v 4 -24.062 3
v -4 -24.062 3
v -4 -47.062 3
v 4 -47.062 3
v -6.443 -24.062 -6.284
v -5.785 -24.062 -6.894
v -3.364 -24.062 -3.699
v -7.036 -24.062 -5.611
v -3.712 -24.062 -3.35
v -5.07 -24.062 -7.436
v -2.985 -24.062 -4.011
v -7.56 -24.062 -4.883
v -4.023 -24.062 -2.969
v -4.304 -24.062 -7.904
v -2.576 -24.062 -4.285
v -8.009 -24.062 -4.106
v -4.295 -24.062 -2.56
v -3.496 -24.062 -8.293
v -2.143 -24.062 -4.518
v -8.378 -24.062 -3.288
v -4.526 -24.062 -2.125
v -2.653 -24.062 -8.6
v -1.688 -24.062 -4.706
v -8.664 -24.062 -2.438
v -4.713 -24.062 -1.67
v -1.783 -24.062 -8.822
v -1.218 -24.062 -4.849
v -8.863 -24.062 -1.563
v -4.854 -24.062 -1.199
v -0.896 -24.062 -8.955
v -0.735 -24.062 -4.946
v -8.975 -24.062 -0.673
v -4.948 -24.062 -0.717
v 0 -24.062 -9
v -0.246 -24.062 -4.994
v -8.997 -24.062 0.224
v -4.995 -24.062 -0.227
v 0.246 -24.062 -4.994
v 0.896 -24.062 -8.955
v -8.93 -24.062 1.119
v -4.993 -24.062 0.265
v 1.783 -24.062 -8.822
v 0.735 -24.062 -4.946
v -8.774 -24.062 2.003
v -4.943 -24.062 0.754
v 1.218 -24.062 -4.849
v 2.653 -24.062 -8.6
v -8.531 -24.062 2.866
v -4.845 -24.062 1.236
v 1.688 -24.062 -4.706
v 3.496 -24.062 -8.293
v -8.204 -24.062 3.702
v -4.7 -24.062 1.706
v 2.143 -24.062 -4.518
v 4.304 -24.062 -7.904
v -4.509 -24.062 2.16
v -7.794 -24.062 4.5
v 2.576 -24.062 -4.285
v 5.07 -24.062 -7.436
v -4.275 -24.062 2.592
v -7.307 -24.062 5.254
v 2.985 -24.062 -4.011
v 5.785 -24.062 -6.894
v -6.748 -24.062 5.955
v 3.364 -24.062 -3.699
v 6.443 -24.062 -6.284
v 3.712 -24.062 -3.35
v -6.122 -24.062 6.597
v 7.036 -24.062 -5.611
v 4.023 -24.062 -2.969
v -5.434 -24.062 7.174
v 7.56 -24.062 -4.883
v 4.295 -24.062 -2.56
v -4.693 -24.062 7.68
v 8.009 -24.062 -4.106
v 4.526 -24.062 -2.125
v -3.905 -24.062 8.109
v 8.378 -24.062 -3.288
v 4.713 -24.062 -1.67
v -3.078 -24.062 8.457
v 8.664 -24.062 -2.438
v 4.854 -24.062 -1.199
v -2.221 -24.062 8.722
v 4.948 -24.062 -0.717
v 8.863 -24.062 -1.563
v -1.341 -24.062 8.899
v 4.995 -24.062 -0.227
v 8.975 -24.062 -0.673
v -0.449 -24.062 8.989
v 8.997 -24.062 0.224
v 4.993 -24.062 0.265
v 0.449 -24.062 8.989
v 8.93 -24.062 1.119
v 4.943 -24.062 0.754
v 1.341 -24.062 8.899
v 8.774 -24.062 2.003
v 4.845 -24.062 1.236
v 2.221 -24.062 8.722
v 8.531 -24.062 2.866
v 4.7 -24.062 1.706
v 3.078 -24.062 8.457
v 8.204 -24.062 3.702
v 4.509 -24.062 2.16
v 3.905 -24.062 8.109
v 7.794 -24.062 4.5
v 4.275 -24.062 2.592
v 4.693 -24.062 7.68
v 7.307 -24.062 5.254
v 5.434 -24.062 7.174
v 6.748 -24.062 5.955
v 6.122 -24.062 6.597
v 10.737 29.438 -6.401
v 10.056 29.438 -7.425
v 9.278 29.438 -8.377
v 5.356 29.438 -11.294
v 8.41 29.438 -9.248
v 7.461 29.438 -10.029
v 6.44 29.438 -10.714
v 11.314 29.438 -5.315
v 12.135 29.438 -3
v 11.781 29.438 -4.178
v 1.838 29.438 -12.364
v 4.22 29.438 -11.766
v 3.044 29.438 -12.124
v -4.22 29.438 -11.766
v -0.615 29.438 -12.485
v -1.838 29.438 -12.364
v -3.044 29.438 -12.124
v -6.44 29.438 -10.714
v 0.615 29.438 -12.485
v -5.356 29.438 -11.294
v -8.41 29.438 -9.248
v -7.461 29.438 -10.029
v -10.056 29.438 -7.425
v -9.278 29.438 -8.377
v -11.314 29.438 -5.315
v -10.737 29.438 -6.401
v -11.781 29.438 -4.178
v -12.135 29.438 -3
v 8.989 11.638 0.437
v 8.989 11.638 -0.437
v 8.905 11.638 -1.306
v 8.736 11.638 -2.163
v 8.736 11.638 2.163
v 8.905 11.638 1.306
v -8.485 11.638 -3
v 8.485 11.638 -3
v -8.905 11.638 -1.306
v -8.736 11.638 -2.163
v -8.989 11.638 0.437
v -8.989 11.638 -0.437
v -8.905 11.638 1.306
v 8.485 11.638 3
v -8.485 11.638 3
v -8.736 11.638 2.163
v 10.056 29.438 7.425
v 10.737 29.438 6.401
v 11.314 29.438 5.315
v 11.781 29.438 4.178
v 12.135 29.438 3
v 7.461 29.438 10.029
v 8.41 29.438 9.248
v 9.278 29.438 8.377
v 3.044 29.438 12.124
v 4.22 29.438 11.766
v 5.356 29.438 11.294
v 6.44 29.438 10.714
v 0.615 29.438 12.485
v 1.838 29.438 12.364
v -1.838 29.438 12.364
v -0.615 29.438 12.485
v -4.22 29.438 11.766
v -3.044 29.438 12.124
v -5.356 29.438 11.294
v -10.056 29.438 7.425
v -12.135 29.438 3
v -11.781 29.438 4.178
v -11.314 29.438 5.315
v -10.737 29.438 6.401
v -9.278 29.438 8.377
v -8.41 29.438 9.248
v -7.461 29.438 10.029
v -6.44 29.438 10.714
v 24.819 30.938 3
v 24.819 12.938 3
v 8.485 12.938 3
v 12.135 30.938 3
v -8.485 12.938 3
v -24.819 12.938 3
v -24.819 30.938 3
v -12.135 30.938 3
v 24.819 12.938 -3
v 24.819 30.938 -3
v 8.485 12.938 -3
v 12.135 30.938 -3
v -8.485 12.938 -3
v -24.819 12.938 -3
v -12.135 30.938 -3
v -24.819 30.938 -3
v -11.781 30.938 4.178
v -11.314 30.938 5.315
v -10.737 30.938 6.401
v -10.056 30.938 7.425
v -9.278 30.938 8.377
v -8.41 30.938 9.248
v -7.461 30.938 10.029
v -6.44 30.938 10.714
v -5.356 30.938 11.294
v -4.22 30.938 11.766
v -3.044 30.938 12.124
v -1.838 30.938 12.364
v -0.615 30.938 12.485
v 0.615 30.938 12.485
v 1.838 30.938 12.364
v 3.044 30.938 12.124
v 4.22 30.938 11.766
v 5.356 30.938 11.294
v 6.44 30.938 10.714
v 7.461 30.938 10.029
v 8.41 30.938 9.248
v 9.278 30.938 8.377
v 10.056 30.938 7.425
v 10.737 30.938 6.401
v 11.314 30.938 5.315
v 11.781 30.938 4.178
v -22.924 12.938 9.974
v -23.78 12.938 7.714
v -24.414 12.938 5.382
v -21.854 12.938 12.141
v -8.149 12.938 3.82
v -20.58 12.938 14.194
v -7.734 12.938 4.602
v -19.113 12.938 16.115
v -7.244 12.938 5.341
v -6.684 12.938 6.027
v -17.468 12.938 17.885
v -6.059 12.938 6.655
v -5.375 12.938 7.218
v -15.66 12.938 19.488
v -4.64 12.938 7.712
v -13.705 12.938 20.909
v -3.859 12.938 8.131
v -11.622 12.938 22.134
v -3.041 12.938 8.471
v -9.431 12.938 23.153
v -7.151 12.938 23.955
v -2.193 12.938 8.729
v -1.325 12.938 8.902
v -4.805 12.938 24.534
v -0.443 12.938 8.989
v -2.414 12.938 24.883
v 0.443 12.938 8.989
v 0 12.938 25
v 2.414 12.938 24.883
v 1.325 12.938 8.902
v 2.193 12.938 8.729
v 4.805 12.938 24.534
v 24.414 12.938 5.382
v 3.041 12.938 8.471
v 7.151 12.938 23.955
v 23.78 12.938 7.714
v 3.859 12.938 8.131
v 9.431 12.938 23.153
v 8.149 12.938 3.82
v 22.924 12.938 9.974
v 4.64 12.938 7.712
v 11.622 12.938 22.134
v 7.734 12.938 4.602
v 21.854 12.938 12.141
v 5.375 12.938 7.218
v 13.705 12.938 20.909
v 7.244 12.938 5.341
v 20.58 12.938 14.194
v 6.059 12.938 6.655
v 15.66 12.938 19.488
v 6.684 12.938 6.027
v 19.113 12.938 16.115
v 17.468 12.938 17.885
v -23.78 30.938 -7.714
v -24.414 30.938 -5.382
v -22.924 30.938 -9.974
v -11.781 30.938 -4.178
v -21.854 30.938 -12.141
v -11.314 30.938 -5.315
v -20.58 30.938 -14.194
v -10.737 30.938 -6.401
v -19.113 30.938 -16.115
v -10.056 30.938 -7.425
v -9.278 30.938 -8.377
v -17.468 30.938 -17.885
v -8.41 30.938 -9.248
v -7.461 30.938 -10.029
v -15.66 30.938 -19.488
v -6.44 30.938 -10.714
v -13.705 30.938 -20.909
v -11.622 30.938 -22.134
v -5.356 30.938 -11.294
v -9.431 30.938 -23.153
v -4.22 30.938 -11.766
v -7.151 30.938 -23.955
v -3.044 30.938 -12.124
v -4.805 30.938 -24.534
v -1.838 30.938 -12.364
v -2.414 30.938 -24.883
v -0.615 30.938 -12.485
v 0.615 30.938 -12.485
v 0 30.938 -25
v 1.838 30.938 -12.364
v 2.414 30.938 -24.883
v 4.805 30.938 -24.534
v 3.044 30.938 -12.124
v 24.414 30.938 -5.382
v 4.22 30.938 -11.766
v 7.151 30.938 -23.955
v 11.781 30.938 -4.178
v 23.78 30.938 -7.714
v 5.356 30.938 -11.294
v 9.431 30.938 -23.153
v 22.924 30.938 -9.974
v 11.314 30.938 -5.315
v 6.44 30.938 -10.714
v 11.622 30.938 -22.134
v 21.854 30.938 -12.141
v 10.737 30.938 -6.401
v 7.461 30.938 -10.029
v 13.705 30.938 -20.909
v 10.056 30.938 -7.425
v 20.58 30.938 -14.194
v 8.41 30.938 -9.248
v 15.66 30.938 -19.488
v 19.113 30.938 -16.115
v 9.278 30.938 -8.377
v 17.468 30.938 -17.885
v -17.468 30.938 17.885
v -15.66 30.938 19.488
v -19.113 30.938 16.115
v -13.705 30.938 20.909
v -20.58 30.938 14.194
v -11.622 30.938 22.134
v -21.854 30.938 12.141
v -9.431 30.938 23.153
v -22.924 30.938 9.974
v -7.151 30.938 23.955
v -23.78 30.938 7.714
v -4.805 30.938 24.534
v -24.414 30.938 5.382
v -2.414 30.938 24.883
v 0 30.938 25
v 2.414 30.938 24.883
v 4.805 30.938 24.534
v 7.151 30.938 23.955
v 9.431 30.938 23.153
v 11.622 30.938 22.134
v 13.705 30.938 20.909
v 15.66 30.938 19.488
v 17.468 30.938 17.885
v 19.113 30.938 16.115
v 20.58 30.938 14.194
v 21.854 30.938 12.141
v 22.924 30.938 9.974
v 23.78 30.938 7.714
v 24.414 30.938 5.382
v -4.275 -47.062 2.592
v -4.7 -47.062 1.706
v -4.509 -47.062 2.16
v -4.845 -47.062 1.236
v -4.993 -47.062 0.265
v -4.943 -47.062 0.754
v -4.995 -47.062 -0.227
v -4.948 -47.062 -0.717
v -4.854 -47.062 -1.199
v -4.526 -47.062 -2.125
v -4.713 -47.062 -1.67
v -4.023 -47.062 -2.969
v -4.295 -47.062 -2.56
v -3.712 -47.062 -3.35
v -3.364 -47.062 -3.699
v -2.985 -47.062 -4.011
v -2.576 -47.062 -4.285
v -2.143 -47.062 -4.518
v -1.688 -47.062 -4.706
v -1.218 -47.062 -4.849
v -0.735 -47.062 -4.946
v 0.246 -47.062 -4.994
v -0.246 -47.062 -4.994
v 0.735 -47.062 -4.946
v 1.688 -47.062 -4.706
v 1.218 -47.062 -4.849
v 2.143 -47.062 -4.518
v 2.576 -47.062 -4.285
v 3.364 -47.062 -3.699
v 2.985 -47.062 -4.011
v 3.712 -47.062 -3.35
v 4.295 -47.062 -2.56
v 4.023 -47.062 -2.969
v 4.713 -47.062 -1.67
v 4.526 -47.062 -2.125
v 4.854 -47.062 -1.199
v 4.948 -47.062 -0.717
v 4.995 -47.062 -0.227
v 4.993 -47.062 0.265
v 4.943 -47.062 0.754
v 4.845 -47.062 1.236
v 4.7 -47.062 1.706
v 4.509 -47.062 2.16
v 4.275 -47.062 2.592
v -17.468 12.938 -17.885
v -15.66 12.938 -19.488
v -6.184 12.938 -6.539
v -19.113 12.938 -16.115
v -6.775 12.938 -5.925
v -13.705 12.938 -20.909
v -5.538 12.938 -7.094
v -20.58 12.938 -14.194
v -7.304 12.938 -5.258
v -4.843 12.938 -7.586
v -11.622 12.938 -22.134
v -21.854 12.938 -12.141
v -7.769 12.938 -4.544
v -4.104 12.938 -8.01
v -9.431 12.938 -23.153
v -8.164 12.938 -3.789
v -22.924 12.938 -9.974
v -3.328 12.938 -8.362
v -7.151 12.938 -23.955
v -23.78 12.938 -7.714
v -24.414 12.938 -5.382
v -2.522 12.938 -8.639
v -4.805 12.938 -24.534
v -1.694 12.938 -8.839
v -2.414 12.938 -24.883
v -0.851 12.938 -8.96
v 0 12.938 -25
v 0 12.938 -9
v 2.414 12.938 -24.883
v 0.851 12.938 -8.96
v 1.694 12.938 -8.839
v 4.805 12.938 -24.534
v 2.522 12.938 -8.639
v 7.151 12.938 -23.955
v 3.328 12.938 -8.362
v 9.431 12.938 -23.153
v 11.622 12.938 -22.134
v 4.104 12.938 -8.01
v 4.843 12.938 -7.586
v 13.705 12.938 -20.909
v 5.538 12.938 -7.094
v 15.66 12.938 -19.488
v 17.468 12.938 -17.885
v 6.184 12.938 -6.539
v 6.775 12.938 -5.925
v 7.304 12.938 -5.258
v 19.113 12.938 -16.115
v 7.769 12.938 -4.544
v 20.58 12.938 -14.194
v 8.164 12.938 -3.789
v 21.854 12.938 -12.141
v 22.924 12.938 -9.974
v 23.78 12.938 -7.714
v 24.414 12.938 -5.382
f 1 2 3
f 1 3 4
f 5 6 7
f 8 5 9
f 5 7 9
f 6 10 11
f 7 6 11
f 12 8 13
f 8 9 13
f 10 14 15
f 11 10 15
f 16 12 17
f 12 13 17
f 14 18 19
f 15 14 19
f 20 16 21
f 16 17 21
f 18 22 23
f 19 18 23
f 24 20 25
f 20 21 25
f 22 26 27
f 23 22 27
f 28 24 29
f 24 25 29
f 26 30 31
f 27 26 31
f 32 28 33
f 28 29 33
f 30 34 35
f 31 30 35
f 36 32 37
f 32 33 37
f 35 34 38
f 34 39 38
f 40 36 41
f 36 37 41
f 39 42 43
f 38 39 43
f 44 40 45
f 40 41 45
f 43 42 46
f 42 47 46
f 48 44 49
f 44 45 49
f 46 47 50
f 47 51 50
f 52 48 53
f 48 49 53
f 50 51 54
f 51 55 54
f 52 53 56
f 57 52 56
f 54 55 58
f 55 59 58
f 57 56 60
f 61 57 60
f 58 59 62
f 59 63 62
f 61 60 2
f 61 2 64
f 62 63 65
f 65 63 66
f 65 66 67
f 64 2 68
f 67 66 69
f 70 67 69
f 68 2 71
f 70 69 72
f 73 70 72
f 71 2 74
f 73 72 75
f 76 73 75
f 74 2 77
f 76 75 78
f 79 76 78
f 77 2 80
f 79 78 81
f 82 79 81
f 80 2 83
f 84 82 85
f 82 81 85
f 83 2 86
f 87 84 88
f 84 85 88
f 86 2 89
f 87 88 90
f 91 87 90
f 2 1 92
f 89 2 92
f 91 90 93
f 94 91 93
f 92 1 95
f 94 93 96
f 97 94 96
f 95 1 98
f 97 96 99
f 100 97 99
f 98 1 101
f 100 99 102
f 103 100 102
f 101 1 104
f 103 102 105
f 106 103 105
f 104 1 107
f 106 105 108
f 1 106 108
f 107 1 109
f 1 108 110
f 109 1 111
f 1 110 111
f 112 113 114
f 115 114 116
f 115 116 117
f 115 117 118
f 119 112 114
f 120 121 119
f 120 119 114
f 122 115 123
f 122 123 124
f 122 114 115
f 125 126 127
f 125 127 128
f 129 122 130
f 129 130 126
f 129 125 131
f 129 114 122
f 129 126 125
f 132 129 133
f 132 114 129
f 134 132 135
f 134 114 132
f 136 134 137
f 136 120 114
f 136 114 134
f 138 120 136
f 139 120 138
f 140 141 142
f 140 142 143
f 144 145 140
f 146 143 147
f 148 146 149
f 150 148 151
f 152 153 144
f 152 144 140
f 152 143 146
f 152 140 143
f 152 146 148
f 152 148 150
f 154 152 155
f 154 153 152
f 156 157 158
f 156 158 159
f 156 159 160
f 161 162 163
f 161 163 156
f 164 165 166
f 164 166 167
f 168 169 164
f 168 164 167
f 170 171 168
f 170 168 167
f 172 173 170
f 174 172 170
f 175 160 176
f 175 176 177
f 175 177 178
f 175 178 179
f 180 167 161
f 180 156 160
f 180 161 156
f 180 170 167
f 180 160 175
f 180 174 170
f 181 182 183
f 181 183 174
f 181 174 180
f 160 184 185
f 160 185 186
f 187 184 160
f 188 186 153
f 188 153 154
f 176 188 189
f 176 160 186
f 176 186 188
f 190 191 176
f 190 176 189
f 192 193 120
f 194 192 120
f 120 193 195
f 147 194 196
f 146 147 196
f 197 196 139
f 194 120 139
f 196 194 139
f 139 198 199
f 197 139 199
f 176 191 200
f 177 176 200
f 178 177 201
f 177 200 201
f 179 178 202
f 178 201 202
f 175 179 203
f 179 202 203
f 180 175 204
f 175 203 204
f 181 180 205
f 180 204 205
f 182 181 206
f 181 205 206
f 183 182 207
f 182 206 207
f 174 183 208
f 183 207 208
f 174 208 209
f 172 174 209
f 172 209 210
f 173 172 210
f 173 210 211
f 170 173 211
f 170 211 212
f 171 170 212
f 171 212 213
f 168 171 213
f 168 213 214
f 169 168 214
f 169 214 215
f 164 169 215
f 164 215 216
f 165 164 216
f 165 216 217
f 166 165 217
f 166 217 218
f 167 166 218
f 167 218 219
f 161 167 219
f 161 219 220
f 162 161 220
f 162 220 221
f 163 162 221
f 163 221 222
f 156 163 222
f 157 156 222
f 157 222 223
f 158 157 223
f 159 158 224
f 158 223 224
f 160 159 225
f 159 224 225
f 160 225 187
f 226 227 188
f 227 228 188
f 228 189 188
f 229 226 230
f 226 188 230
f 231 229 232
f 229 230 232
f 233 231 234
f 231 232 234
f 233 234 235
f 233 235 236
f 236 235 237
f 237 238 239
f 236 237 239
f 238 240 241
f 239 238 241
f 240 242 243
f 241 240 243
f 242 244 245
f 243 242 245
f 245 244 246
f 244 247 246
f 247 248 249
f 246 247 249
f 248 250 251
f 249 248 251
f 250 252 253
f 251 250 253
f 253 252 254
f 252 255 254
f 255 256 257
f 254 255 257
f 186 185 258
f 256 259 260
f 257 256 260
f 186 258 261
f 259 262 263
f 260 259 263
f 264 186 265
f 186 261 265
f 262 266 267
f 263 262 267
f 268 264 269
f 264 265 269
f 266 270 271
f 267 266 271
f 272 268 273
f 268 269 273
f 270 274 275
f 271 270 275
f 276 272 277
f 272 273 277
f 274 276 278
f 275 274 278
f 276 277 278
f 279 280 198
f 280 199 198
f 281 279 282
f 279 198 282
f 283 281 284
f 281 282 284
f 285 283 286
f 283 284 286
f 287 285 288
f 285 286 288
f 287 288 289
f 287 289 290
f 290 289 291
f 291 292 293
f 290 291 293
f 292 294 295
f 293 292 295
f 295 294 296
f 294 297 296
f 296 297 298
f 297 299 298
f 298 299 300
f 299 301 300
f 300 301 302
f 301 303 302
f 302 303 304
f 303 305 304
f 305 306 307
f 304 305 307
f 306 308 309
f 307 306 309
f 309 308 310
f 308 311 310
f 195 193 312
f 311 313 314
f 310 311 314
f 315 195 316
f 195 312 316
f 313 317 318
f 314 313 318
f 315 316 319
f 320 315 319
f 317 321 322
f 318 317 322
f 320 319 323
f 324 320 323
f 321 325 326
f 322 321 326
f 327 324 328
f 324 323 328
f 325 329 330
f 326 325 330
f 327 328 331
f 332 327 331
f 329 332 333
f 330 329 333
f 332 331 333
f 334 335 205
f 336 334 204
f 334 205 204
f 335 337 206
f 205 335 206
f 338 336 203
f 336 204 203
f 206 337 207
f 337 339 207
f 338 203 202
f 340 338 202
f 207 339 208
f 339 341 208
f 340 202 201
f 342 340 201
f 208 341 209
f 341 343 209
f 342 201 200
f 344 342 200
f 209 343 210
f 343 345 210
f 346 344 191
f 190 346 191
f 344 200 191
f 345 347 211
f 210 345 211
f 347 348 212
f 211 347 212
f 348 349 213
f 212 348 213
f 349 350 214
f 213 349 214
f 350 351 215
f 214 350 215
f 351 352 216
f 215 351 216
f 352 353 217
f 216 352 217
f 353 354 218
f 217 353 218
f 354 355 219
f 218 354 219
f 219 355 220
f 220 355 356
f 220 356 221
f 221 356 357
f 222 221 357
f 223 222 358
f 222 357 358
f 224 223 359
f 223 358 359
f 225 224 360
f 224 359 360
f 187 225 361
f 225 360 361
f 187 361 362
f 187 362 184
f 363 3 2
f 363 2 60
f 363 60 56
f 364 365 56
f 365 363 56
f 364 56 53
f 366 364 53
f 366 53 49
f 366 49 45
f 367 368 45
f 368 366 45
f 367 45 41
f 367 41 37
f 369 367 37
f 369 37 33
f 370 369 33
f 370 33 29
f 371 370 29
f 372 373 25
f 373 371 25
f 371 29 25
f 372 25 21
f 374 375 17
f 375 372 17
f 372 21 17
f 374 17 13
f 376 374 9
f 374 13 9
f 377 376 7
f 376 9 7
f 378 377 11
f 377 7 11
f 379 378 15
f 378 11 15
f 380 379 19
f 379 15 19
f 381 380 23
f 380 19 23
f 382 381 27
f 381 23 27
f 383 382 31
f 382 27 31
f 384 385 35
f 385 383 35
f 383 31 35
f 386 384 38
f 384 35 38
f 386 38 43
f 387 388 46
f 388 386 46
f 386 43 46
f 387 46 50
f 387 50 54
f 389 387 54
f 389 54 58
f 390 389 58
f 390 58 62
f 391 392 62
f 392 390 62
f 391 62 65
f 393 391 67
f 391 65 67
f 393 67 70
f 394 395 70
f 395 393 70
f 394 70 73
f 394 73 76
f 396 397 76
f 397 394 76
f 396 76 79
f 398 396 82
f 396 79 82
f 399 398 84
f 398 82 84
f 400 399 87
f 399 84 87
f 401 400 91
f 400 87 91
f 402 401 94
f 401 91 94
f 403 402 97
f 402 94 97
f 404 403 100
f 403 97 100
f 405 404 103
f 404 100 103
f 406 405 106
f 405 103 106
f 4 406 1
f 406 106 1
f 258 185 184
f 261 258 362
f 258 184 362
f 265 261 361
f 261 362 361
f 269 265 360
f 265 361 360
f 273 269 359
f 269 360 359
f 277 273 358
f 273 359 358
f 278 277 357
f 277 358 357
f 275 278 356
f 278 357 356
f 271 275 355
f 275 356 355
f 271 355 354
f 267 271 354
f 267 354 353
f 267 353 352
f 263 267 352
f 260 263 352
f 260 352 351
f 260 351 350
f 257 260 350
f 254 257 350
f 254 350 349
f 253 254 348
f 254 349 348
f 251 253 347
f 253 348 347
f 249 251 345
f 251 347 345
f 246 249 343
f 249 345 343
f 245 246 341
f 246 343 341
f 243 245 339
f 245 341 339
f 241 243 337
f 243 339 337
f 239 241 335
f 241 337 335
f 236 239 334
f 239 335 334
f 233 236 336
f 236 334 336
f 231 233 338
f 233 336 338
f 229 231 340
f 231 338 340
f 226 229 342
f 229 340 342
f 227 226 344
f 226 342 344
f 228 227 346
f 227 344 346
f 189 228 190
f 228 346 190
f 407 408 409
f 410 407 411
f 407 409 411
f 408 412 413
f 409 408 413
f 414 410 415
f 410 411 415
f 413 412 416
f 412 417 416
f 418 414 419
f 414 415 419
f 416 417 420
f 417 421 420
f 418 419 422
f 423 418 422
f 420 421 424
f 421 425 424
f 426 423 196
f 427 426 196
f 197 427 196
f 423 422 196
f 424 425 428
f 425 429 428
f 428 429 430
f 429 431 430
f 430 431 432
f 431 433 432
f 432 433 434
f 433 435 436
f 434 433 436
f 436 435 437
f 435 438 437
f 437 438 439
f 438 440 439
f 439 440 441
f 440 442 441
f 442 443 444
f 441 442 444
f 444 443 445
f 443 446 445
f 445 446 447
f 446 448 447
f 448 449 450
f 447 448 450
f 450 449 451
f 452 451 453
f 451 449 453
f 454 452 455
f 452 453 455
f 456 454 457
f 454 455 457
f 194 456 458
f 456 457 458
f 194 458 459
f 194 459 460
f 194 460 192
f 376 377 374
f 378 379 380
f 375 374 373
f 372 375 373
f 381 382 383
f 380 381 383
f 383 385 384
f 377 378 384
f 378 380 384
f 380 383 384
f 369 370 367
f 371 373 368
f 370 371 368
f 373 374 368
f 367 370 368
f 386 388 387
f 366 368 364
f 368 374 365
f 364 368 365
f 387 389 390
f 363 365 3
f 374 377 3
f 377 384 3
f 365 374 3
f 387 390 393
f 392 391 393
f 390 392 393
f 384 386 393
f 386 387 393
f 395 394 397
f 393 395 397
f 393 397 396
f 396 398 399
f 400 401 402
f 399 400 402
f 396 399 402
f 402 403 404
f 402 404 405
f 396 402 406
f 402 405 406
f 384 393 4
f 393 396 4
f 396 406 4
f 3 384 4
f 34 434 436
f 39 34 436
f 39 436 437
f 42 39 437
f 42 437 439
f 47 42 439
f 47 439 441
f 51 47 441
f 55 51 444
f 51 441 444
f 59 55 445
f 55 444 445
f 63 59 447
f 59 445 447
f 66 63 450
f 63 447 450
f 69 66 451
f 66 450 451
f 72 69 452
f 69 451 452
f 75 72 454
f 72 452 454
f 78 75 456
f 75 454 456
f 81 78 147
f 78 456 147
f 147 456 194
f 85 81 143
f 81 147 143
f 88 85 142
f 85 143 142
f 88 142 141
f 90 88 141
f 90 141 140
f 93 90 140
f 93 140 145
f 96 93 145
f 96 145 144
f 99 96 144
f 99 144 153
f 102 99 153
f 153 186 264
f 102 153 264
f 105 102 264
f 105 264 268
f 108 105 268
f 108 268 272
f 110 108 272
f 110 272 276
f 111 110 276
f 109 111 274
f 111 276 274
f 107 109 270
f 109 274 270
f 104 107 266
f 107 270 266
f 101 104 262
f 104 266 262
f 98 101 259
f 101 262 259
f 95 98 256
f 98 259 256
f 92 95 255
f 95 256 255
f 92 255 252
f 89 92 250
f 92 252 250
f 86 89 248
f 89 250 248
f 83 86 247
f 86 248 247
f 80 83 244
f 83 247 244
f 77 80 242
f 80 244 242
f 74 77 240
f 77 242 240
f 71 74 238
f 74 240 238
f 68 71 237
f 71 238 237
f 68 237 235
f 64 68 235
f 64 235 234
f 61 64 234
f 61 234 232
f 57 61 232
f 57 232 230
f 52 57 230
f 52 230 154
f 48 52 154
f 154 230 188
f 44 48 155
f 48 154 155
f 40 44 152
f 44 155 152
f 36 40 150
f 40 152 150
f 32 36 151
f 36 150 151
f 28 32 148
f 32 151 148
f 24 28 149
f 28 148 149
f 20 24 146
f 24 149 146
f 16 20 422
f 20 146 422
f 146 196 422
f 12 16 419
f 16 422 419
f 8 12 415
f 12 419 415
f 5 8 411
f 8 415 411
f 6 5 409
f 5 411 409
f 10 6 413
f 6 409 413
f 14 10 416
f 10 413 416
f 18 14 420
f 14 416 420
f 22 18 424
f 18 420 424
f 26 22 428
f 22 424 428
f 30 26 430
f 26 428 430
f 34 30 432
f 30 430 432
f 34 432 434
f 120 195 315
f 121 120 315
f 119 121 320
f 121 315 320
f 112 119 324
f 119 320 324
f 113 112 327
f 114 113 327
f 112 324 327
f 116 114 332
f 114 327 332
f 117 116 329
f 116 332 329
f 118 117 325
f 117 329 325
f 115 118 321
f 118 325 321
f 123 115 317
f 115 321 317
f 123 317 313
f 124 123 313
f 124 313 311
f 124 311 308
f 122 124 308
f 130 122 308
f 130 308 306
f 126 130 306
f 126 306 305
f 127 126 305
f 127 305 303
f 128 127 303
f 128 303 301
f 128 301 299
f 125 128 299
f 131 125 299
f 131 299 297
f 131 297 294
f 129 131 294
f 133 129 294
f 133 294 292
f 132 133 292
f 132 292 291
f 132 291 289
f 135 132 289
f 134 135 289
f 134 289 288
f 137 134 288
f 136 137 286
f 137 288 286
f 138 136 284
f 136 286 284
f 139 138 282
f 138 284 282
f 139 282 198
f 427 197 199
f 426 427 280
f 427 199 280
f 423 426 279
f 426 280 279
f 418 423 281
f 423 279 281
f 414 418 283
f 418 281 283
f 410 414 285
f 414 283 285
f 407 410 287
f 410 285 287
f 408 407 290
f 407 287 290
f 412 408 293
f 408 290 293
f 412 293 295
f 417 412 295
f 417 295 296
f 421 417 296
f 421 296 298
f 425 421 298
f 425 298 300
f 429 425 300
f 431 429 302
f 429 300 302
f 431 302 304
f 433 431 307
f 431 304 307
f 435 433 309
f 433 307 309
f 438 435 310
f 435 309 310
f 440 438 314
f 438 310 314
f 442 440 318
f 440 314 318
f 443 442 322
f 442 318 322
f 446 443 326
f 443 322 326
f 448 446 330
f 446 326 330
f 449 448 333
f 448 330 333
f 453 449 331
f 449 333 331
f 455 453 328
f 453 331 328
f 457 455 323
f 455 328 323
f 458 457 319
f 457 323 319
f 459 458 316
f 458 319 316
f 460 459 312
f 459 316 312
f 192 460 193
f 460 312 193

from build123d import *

# Parameters (mm, degrees)
F2_W     = 32.767532
F2_H     = 10.747779
F3_DEPTH = 23
F4_W     = 55
F4_H     = 6
F5_DEPTH = 19.3
F6_R     = 12.5
F7_DEPTH = 1.5


with BuildPart() as f1:
    # F0 (on Right) → F1 (revolve)
    with BuildSketch(Plane.YZ):
        Polygon((30.937984, -25), (30.937984, 0), (-47.062016, 0), (-47.062016, -5), (-24.062016, -5), (-24.062016, -9), (12.937984, -9), (12.937984, -25), align=None)
    revolve(axis=Axis((0, -8.062016, 0), (0, -1, 0)))

    # F2 (on face) → F3 (cut, through all)
    with BuildSketch(Plane.XZ.offset(47.062016)):
        with Locations((-0.172598, 8.37389)):
            Rectangle(F2_W, F2_H)
    extrude(amount=-F3_DEPTH, mode=Mode.SUBTRACT)

    # F4 (on face) → F5 (cut)
    with BuildSketch(Plane(origin=(0, 30.937984, 0), x_dir=(-1, 0, 0), z_dir=(0, 1, 0))):
        Rectangle(F4_W, F4_H)
    extrude(amount=-F5_DEPTH, mode=Mode.SUBTRACT)

    # F6 (on face) → F7 (cut)
    with BuildSketch(Plane(origin=(0, 30.937984, 0), x_dir=(-1, 0, 0), z_dir=(0, 1, 0))):
        Circle(F6_R)
    extrude(amount=-F7_DEPTH, mode=Mode.SUBTRACT)


solid = f1.part
